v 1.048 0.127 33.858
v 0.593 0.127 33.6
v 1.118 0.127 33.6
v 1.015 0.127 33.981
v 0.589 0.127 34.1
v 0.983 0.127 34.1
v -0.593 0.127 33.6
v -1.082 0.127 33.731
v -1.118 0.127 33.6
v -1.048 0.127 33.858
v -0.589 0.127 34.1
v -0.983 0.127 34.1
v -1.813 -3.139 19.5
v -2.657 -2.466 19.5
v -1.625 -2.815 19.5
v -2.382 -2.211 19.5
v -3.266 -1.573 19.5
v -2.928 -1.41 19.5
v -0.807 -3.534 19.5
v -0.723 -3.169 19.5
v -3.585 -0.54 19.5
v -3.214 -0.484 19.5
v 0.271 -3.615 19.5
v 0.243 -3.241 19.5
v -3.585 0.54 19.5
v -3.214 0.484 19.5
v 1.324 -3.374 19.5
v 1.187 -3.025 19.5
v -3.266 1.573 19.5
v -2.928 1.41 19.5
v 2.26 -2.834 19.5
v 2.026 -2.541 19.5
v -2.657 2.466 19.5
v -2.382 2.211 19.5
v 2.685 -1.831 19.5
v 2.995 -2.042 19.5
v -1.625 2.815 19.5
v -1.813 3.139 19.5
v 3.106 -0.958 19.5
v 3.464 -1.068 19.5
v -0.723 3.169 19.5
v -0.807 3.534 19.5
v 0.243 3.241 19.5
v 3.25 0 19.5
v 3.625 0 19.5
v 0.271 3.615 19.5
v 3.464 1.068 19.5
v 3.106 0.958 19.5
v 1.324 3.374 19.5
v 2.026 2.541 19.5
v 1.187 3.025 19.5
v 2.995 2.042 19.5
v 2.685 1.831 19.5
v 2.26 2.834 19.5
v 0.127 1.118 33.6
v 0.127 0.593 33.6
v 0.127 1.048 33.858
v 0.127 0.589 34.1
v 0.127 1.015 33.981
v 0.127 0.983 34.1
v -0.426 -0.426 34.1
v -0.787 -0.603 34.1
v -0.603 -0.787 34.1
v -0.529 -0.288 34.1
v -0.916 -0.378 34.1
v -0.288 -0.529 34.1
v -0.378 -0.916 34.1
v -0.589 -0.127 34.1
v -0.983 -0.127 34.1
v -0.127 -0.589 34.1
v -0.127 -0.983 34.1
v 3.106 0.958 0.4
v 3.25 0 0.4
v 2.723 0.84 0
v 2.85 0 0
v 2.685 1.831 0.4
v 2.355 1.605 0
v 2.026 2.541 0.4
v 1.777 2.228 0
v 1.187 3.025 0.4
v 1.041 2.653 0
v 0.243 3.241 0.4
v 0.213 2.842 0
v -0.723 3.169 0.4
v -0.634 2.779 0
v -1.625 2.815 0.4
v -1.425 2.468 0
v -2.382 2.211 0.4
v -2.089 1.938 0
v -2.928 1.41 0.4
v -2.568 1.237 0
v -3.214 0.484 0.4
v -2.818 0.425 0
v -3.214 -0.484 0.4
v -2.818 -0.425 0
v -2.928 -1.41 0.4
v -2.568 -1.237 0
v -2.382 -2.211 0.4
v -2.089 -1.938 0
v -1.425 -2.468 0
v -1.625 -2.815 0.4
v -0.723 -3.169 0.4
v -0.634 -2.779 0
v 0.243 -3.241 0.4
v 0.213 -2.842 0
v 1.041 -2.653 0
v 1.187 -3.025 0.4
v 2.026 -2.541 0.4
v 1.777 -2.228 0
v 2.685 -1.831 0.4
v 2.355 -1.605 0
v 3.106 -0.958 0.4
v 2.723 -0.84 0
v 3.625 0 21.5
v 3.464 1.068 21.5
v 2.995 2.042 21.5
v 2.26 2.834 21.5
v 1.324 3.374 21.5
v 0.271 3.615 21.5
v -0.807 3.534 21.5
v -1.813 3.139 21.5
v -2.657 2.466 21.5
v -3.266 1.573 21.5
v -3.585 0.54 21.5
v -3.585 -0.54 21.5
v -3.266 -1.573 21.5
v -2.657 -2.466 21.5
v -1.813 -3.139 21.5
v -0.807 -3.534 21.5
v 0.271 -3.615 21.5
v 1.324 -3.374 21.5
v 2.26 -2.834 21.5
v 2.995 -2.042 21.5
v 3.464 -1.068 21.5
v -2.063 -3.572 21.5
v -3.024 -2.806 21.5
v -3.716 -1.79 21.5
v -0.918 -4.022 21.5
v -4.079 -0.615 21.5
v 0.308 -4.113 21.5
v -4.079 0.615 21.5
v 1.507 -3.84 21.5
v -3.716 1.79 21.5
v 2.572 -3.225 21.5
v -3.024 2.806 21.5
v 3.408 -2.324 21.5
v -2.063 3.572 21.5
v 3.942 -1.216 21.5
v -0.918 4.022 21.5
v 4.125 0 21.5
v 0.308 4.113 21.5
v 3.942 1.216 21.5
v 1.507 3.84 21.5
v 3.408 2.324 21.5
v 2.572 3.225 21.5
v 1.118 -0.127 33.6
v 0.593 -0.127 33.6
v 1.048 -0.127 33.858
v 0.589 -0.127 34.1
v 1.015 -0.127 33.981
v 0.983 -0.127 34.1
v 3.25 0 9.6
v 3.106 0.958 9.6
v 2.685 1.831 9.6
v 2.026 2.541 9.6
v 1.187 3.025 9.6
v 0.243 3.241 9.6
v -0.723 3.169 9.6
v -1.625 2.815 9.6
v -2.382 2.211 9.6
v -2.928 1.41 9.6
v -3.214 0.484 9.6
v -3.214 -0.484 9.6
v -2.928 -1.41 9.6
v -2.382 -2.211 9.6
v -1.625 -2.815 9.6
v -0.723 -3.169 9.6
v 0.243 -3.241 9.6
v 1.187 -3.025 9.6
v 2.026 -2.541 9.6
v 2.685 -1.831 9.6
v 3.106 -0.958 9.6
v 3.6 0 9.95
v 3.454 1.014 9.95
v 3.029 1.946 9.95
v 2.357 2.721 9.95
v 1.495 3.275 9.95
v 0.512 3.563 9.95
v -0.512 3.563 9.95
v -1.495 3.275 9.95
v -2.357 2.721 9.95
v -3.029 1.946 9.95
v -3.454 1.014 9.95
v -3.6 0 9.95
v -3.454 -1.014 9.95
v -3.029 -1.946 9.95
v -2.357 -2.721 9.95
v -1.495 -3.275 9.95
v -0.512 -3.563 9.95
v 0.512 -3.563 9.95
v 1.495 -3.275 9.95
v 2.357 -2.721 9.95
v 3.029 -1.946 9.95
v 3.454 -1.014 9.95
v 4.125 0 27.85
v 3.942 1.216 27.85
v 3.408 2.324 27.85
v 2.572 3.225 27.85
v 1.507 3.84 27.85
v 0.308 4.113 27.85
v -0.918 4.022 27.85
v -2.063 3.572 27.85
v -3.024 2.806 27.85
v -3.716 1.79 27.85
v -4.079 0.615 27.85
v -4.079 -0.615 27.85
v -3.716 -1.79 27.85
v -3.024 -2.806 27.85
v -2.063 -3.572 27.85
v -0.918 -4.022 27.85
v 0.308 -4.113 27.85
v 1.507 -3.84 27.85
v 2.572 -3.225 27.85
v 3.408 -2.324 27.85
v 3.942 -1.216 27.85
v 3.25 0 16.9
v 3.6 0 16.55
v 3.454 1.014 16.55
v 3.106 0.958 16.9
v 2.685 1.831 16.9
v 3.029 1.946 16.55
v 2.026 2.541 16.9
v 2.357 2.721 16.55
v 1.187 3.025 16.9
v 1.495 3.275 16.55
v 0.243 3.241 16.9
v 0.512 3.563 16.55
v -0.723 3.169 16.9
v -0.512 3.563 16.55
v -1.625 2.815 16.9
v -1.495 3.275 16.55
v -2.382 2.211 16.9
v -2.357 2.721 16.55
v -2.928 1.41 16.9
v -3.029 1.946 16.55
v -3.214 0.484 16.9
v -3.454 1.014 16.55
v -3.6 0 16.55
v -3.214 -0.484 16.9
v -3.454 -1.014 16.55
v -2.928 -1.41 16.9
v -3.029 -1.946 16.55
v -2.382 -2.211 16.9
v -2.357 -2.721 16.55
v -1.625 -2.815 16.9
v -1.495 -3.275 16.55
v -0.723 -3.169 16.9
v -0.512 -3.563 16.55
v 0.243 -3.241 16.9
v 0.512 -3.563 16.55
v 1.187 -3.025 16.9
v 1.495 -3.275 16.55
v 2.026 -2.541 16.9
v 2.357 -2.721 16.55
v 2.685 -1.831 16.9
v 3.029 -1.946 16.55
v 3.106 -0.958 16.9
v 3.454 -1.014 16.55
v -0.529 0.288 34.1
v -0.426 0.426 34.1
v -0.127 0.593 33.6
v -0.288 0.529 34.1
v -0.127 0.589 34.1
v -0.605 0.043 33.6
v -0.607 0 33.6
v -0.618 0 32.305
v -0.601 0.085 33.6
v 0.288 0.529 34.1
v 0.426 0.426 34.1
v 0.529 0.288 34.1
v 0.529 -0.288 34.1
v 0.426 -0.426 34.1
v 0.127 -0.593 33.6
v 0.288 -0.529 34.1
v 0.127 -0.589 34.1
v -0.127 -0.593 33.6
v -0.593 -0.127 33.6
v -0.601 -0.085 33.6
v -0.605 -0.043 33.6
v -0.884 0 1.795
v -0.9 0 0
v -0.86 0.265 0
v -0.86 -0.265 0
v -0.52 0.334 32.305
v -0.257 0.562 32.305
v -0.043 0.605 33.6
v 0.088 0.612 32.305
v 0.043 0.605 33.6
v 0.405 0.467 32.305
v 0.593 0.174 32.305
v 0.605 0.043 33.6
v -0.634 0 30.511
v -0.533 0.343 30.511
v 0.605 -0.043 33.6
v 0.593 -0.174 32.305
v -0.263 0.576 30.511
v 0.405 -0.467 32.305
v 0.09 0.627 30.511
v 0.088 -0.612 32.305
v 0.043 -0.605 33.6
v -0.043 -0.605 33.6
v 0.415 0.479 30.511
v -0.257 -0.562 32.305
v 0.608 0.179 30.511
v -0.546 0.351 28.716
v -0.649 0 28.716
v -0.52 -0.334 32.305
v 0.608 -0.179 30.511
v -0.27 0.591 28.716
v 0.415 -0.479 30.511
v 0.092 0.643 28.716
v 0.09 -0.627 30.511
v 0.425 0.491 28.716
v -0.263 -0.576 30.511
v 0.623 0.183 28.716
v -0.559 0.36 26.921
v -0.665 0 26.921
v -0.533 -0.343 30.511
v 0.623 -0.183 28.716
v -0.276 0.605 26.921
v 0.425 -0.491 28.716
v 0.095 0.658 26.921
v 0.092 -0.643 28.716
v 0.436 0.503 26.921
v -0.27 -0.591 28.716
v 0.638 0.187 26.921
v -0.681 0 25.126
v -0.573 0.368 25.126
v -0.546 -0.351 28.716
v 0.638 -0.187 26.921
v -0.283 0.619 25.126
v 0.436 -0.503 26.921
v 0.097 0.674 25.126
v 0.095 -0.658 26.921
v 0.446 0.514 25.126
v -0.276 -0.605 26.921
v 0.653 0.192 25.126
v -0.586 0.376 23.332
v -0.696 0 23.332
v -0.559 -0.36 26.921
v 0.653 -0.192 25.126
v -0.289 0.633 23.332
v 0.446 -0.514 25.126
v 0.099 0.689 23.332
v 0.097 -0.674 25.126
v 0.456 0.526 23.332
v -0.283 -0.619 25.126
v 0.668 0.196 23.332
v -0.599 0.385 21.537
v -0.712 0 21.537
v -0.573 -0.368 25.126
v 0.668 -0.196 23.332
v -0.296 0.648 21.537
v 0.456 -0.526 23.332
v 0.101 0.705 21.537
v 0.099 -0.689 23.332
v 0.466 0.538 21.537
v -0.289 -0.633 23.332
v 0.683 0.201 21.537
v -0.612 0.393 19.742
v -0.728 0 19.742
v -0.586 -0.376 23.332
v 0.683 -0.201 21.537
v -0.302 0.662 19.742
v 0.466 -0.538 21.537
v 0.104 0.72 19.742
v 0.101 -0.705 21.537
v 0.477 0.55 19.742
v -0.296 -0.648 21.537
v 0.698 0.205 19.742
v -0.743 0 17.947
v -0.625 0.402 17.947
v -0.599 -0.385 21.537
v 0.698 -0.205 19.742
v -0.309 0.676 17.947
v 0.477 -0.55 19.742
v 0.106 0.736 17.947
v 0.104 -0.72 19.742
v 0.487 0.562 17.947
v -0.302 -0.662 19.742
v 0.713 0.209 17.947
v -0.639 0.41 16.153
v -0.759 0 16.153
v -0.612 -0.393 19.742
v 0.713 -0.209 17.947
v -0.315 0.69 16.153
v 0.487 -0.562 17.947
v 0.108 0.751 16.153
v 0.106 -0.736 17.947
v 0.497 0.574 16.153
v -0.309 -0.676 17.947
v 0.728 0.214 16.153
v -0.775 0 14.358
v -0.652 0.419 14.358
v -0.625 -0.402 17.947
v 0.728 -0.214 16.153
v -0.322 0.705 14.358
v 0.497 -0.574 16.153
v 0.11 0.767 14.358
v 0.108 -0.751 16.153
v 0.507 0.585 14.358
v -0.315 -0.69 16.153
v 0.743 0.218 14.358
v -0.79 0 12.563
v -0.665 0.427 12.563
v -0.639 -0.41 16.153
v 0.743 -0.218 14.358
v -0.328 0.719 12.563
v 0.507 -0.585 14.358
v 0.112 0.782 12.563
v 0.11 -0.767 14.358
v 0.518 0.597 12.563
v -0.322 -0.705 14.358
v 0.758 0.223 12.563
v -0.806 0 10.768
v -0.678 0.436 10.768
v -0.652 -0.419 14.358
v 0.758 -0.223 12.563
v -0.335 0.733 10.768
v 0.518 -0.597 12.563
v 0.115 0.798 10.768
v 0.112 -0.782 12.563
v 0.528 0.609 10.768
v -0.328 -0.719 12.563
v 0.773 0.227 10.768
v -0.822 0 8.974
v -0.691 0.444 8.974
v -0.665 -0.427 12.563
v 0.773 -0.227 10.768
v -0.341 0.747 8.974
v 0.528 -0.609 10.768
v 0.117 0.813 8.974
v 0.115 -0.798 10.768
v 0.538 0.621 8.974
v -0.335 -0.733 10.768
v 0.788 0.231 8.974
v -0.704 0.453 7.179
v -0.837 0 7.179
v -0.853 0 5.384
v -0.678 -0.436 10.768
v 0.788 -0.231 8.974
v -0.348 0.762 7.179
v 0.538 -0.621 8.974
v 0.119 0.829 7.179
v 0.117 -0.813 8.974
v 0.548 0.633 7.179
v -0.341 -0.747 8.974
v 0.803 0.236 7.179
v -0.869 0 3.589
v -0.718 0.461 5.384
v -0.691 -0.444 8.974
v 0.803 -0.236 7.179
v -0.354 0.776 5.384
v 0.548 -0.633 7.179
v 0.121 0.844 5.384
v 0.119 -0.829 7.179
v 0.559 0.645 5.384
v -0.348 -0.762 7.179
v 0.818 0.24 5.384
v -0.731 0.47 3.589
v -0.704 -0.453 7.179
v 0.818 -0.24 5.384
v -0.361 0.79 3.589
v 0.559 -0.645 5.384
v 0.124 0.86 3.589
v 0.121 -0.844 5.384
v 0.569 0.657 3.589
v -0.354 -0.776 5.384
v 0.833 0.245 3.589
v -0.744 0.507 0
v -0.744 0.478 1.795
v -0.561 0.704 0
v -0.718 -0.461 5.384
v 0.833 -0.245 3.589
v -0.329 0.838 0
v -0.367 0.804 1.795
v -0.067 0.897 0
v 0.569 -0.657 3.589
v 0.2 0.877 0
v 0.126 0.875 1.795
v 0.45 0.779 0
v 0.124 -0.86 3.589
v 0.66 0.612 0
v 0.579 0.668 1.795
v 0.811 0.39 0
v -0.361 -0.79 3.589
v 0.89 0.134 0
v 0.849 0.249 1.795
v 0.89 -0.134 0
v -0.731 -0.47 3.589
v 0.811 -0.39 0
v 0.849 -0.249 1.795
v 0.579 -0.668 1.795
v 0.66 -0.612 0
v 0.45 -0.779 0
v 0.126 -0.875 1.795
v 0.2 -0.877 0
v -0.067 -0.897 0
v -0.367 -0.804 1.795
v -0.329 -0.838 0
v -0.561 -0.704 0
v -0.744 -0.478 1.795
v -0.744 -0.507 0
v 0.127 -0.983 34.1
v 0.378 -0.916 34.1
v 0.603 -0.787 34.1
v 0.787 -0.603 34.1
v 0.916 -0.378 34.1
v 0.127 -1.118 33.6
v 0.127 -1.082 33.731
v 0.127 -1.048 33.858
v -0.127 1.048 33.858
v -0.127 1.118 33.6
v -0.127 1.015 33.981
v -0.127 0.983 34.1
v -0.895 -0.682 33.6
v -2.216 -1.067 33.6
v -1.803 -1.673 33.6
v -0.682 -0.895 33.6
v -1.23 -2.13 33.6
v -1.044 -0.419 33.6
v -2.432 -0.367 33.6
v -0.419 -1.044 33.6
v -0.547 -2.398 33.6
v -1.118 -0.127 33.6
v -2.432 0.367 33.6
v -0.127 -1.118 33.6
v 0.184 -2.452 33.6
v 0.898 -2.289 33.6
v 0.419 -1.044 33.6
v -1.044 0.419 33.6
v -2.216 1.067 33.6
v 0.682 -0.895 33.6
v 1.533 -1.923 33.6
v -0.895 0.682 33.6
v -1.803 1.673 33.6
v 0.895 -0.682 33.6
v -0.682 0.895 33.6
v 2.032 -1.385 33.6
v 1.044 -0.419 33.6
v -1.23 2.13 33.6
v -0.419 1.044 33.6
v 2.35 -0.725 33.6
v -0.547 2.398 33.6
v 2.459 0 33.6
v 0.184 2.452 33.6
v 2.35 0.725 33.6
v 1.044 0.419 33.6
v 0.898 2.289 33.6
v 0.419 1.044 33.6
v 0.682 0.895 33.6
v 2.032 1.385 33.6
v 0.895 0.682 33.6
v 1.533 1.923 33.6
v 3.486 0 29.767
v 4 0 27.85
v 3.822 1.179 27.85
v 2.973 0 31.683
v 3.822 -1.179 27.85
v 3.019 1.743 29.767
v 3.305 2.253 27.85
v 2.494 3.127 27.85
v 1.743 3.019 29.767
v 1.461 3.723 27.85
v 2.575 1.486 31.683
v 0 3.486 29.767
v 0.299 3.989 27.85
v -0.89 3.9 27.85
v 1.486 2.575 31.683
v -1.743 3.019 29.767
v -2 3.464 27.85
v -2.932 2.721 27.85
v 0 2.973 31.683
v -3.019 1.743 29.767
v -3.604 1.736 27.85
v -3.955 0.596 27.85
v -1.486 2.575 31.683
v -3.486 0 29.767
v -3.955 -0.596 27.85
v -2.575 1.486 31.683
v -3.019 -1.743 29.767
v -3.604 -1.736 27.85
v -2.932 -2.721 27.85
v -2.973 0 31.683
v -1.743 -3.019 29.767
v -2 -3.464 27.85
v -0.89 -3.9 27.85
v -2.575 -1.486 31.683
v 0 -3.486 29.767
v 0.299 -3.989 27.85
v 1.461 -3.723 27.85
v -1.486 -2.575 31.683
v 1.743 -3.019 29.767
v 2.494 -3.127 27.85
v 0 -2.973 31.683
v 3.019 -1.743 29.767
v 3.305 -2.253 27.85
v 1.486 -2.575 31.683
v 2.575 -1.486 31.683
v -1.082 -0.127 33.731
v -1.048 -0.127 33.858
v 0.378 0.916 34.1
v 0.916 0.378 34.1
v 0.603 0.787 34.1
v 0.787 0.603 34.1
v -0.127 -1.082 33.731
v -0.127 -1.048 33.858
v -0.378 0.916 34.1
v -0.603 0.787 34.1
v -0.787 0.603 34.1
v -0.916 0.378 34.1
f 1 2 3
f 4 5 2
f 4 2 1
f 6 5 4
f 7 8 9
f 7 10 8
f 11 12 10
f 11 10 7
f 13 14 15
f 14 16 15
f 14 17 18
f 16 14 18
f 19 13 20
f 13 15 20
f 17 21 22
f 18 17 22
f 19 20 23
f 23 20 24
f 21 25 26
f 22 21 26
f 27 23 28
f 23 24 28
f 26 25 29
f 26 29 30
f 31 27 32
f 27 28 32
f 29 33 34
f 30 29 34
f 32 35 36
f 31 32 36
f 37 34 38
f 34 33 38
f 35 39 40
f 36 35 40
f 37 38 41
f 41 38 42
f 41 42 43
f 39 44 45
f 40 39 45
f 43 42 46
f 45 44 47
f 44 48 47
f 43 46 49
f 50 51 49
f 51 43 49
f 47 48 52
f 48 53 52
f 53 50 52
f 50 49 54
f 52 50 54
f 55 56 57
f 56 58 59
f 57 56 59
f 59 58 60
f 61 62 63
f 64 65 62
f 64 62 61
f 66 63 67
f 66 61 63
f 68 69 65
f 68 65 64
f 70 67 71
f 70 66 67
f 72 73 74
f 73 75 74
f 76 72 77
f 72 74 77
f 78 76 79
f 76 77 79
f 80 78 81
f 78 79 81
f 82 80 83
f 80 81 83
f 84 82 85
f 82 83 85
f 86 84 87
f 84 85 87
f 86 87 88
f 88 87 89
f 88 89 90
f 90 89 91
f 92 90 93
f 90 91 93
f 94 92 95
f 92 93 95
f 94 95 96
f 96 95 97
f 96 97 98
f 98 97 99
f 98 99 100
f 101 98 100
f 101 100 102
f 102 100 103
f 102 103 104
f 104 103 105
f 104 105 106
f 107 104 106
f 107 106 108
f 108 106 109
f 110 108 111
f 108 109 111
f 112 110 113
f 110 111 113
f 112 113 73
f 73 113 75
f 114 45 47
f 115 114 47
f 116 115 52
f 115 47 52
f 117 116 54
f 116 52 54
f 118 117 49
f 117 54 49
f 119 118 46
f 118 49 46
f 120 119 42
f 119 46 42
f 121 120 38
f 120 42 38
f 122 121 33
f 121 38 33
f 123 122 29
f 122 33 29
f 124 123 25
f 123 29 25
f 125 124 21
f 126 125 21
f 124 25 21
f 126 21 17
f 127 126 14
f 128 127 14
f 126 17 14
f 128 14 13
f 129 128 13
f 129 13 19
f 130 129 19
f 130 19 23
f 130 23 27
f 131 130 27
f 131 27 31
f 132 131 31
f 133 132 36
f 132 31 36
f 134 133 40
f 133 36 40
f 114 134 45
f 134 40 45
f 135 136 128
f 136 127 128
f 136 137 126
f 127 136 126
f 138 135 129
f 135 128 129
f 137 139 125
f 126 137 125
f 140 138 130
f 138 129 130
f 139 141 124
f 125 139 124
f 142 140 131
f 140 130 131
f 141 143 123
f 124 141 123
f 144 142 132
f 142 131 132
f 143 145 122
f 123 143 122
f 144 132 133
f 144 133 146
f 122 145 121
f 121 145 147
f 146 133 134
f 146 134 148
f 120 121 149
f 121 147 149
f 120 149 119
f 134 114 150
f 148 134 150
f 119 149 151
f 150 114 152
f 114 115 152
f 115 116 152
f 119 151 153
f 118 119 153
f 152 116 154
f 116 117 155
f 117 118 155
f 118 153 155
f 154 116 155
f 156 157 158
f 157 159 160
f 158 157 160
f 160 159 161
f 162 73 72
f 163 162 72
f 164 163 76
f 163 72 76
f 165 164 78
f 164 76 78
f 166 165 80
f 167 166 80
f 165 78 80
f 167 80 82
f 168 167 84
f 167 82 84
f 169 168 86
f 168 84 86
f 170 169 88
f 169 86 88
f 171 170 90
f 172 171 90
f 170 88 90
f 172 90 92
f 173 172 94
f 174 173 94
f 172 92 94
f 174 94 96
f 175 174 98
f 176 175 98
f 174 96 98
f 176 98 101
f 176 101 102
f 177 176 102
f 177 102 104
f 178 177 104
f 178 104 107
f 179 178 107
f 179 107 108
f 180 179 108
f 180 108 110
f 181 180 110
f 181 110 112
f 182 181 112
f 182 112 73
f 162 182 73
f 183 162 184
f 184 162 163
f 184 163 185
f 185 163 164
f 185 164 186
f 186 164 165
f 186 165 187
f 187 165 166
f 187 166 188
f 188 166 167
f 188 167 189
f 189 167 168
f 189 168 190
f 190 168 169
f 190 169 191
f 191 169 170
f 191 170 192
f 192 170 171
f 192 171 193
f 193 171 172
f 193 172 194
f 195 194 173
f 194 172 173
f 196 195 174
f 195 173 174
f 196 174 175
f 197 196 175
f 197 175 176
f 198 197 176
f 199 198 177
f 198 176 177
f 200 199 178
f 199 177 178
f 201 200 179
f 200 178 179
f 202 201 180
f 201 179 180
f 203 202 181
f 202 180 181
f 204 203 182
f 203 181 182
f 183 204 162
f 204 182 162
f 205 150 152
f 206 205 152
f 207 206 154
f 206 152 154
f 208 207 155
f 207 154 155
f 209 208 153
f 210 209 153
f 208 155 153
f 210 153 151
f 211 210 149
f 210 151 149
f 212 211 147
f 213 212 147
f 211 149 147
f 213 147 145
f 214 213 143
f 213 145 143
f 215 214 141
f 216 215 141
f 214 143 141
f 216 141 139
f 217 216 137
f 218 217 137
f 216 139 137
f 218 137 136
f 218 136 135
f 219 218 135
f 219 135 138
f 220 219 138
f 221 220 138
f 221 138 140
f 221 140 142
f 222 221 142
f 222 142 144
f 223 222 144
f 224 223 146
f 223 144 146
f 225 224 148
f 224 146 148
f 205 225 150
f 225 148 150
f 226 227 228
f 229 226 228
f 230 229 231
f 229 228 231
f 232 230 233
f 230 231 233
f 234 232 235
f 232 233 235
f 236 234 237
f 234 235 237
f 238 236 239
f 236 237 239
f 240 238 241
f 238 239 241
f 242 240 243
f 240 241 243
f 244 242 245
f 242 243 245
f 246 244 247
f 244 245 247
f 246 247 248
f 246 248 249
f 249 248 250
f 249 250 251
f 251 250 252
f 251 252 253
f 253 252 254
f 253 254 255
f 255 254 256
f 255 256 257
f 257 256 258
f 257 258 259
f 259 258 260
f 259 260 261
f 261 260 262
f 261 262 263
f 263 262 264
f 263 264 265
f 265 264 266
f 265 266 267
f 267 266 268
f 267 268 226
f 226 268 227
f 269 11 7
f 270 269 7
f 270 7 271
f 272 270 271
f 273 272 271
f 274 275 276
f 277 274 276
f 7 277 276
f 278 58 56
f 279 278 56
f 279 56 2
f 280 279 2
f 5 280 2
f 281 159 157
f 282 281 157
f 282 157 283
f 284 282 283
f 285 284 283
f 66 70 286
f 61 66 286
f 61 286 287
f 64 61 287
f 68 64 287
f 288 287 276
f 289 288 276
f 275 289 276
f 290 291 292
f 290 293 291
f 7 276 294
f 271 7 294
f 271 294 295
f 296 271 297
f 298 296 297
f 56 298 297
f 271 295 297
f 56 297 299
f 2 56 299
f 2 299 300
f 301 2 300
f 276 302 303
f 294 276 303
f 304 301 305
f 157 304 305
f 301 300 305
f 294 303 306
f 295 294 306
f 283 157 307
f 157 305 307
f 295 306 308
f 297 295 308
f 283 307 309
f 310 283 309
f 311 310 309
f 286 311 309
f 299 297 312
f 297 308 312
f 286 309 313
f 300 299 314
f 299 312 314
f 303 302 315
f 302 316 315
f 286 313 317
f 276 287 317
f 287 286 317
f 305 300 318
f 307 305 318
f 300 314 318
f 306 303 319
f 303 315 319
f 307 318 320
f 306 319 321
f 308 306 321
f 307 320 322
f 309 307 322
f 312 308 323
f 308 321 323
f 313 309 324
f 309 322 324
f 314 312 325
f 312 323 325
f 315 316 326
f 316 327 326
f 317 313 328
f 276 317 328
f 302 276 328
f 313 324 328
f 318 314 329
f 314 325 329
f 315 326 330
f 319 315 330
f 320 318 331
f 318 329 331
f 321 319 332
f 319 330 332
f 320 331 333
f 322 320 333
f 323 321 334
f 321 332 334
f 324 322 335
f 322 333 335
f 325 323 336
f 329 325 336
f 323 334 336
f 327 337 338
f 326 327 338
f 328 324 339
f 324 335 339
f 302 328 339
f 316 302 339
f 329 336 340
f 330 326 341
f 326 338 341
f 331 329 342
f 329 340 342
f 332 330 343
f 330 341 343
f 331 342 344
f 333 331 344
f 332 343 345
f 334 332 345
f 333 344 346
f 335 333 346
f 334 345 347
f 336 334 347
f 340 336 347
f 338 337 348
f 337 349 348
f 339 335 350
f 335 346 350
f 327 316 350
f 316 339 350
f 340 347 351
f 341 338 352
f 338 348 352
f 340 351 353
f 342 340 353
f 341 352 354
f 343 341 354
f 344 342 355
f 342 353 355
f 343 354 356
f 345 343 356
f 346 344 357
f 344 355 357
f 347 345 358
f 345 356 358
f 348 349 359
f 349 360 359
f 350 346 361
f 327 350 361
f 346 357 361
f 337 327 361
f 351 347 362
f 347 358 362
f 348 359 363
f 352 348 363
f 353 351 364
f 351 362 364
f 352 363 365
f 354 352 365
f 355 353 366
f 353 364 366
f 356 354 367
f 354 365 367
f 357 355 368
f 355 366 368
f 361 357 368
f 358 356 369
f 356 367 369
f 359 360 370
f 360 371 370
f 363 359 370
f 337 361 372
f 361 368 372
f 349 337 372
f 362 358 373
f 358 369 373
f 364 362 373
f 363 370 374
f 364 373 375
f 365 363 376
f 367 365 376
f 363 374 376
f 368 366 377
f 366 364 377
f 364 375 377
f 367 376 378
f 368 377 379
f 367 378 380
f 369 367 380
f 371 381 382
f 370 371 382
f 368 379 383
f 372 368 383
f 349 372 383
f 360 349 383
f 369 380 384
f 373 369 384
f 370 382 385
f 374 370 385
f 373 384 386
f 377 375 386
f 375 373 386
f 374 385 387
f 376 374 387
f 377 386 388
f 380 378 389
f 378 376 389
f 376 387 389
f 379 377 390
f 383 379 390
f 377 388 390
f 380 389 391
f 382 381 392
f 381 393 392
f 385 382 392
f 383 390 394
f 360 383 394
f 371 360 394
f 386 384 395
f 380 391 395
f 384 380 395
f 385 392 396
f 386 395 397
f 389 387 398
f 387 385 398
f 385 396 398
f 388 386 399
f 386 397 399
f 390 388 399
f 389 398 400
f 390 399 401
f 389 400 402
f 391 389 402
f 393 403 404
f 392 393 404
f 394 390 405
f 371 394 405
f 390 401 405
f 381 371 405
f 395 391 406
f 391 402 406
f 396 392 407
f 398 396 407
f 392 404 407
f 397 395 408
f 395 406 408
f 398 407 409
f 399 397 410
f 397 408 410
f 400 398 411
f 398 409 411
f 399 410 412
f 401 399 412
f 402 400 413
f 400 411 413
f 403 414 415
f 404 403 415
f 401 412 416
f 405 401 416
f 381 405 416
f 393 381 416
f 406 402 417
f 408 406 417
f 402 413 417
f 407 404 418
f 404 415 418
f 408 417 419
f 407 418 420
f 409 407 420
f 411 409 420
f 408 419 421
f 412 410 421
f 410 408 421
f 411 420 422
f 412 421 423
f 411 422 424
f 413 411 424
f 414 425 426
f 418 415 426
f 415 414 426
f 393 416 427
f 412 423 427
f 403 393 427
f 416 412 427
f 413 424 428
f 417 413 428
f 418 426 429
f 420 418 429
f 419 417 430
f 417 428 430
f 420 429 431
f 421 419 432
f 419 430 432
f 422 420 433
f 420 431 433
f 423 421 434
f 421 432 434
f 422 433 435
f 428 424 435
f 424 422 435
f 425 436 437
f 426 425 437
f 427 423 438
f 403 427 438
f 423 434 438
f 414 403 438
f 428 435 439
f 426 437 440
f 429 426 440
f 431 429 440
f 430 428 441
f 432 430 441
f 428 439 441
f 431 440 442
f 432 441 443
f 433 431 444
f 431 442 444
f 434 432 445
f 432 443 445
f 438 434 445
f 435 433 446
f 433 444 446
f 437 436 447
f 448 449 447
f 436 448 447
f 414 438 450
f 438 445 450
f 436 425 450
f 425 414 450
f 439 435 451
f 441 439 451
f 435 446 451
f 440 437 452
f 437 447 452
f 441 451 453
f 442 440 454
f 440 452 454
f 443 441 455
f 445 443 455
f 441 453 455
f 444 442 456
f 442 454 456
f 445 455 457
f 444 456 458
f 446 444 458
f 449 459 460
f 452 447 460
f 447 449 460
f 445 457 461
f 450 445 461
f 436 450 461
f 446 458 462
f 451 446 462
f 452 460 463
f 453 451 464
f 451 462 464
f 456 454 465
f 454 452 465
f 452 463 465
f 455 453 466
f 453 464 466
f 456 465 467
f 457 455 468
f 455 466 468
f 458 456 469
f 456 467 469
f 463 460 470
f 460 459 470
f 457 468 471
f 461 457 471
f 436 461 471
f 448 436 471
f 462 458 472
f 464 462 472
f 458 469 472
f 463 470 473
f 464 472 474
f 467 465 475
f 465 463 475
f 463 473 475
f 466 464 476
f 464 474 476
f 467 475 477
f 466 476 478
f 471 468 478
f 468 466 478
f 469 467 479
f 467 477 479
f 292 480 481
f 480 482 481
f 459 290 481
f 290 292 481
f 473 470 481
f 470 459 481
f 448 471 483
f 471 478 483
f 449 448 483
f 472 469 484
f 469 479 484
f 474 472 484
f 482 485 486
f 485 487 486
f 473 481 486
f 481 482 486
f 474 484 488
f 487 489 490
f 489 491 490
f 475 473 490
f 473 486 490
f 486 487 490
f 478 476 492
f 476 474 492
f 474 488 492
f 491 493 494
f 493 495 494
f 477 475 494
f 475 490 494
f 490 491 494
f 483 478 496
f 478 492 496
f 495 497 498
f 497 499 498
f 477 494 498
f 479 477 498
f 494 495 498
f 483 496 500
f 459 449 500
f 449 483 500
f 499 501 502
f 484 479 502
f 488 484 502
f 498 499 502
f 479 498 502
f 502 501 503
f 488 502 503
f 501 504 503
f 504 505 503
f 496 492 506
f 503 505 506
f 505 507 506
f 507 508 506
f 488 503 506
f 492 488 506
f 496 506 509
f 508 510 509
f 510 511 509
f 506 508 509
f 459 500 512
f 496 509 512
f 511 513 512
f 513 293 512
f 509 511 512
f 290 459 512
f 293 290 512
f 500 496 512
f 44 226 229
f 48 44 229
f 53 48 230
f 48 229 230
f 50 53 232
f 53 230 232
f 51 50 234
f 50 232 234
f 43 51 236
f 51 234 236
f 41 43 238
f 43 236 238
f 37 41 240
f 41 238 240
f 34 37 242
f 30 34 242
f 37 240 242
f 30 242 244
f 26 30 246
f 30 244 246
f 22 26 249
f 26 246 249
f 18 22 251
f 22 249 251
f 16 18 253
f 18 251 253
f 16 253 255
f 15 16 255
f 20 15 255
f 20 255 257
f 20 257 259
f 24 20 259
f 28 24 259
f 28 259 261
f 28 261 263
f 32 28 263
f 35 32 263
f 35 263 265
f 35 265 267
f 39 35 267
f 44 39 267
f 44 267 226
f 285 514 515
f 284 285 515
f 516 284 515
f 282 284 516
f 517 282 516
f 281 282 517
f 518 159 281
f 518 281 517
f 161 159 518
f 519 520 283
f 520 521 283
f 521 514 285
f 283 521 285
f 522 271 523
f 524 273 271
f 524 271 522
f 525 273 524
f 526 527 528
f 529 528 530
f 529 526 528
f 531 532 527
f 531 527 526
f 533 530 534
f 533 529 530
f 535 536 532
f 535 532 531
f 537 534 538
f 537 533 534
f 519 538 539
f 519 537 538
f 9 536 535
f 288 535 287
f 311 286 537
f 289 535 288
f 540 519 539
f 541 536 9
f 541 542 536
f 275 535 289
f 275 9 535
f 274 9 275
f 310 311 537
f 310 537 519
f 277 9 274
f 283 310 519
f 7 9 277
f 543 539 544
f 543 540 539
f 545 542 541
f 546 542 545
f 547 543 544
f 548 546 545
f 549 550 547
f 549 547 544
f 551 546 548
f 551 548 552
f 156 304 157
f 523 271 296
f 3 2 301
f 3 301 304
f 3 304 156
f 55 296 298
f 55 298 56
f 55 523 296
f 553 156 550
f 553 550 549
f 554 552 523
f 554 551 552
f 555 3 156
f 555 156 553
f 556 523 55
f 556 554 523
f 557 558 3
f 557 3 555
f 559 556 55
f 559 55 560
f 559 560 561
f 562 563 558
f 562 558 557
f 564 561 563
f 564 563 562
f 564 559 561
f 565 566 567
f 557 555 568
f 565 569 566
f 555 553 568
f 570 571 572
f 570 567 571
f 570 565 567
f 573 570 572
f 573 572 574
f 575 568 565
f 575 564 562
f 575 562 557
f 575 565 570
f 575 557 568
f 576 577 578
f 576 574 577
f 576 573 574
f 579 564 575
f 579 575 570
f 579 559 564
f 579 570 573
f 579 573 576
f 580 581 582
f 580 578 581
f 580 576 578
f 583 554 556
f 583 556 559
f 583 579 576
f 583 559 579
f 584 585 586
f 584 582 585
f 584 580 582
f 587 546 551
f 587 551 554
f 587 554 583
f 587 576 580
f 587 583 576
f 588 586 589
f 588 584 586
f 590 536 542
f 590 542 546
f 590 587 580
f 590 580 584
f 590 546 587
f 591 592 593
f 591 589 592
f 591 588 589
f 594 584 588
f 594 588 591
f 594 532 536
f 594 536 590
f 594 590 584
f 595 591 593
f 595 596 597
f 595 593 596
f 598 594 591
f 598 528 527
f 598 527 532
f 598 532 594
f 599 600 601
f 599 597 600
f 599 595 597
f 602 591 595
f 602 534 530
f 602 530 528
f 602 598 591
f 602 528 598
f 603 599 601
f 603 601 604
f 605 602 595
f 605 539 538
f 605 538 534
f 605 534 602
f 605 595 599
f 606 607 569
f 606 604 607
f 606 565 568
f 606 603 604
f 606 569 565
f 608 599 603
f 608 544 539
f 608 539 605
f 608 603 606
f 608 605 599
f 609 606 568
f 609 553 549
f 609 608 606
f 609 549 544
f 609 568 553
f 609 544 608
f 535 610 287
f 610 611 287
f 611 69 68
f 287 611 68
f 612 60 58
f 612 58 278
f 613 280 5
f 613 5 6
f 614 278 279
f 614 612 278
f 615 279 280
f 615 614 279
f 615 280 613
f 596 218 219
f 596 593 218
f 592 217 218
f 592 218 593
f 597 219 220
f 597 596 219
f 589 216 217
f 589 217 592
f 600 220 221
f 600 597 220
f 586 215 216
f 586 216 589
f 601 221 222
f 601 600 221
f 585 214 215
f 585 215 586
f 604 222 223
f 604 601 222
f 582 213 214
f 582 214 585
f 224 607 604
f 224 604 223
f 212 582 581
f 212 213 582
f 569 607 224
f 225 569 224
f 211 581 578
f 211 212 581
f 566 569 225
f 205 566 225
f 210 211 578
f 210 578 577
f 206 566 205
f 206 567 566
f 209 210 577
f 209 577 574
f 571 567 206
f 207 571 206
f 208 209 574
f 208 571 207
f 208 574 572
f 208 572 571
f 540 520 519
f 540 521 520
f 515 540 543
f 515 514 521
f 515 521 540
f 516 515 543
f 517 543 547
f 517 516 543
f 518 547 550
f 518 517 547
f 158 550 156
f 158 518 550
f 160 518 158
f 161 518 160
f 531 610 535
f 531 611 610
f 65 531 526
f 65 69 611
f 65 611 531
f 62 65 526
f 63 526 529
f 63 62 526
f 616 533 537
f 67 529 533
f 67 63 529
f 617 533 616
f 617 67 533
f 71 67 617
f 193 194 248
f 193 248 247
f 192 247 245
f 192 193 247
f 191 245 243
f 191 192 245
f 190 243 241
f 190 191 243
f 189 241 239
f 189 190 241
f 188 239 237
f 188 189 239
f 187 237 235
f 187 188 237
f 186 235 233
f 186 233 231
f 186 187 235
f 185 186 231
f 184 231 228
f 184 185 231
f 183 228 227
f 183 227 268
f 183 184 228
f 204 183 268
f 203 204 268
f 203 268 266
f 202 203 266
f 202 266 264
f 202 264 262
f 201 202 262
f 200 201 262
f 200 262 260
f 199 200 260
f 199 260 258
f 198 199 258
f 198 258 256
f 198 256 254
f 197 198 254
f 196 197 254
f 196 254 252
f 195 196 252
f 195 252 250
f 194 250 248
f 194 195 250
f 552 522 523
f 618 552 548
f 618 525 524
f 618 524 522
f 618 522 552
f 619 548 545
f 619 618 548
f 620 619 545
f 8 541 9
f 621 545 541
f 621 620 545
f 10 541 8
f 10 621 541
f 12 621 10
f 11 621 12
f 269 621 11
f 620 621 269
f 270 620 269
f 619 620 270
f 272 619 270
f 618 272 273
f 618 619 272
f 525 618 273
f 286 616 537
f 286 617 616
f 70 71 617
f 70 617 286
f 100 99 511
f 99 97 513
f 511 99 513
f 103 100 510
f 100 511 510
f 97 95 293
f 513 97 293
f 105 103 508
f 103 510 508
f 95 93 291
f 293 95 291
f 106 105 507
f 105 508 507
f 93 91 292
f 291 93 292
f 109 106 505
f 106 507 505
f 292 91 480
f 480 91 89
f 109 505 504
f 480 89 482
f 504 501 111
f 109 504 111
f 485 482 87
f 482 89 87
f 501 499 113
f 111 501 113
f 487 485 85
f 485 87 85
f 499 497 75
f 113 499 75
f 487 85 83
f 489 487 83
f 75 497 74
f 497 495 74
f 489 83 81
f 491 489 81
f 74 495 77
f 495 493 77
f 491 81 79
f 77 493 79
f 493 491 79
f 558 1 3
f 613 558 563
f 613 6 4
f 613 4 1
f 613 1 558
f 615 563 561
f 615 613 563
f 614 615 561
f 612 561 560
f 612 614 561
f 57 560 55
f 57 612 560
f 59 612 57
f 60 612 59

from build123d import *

# Parameters (mm, degrees)
SKETCH1_R               = 3.25
EXTRUDE1_DEPTH          = 10
SKETCH2_R               = 3.6
EXTRUDE2_DEPTH          = 6.5
SKETCH3_R               = 3.25
EXTRUDE3_DEPTH          = 3
SKETCH4_R               = 3.625
EXTRUDE4_DEPTH          = 2
SKETCH5_R               = 4.125
EXTRUDE5_DEPTH          = 6.35
SKETCH6_R               = 4
EXTRUDE6_DEPTH          = 5.75
EXTRUDE6_TAPER          = 15
SKETCH7_R               = 1.125
EXTRUDE7_DEPTH          = 0.5
EXTRUDE7_TAPER          = 15
SKETCH8_W               = 0.254
SKETCH8_H               = 4.684061481
CUT_EXTRUDE_THIN2_DEPTH = 0.5
SKETCH9_W               = 3.205351329
SKETCH9_H               = 0.254
CUT_EXTRUDE_THIN3_DEPTH = 0.5
CHAMFER1_SIZE           = 0.4
SKETCH10_R              = 0.9
CUT_EXTRUDE1_DEPTH      = 34.1
CUT_EXTRUDE1_DRAFT      = -0.5


with BuildPart() as part:
    # Sketch1 → Extrude1 (new body)
    with BuildSketch(Plane.XY):
        Circle(SKETCH1_R)
    extrude(amount=EXTRUDE1_DEPTH)

    # Sketch2 → Extrude2 (add)
    with BuildSketch(Plane.XY.offset(10)):
        with Locations(Location((0, 0, 0), (0, 0, 180))):
            Circle(SKETCH2_R)
    extrude(amount=EXTRUDE2_DEPTH)

    # Sketch3 → Extrude3 (add)
    with BuildSketch(Plane.XY.offset(16.5)):
        Circle(SKETCH3_R)
    extrude(amount=EXTRUDE3_DEPTH)

    # Sketch4 → Extrude4 (add)
    with BuildSketch(Plane.XY.offset(19.5)):
        Circle(SKETCH4_R)
    extrude(amount=EXTRUDE4_DEPTH)

    # Sketch5 → Extrude5 (add)
    with BuildSketch(Plane.XY.offset(21.5)):
        Circle(SKETCH5_R)
    extrude(amount=EXTRUDE5_DEPTH)

    # Sketch6 → Extrude6 (add)
    with BuildSketch(Plane.XY.offset(27.85)):
        Circle(SKETCH6_R)
    extrude(amount=EXTRUDE6_DEPTH, taper=EXTRUDE6_TAPER)

    # Sketch7 → Extrude7 (add)
    with BuildSketch(Plane.XY.offset(33.6)):
        Circle(SKETCH7_R)
    extrude(amount=EXTRUDE7_DEPTH, taper=EXTRUDE7_TAPER)

    # Sketch8 → Cut-Extrude-Thin2 (cut)
    with BuildSketch(Plane.XY.offset(34.1)):
        with Locations((0, -0.157007647)):
            Rectangle(SKETCH8_W, SKETCH8_H)
    extrude(amount=-CUT_EXTRUDE_THIN2_DEPTH, mode=Mode.SUBTRACT)

    # Sketch9 → Cut-Extrude-Thin3 (cut)
    with BuildSketch(Plane.XY.offset(34.1)):
        with Locations((-0.477675664, 0)):
            Rectangle(SKETCH9_W, SKETCH9_H)
    extrude(amount=-CUT_EXTRUDE_THIN3_DEPTH, mode=Mode.SUBTRACT)

    # Chamfer1
    # the kernel refuses this chamfer: 0.4 mm, written as the material it adds along each edge
    with BuildSketch(Plane(origin=(0, 0, 16.5), x_dir=(1, 0, 0), z_dir=(0, -1, 0))) as chamfer1_piece_1_section:
        Polygon((3.25, CHAMFER1_SIZE), (3.25 + CHAMFER1_SIZE, 0), (3.25, 0), align=None)
    chamfer1_piece_1 = revolve(axis=Axis((0, 0, 16.5), (0, 0, 1)), mode=Mode.PRIVATE)
    chamfer1_piece_1 = chamfer1_piece_1 & Plane(origin=(0, 0, 16.722023518), x_dir=(-1, 0, 0), z_dir=(0, 0, -1)) * Cylinder(3.6, 15, mode=Mode.PRIVATE)
    add(chamfer1_piece_1)
    with BuildSketch(Plane(origin=(0, 0, 10), x_dir=(1, 0, 0), z_dir=(0, -1, 0))) as chamfer1_piece_2_section:
        Polygon((3.25 + CHAMFER1_SIZE, 0), (3.25, -CHAMFER1_SIZE), (3.25, 0), align=None)
    chamfer1_piece_2 = revolve(axis=Axis((0, 0, 10), (0, 0, 1)), mode=Mode.PRIVATE)
    chamfer1_piece_2 = chamfer1_piece_2 & Plane(origin=(0, 0, 9.777976482), x_dir=(-1, 0, 0), z_dir=(0, 0, -1)) * Cylinder(3.6, 15, mode=Mode.PRIVATE)
    add(chamfer1_piece_2)
    # the kernel refuses this chamfer: 0.4 mm, written as the material it takes off along each edge
    with BuildSketch(Plane(origin=(0, 0, 0), x_dir=(1, 0, 0), z_dir=(0, -1, 0))) as chamfer1_2_piece_1:
        Polygon((3.25, CHAMFER1_SIZE), (3.25 - CHAMFER1_SIZE, 0), (3.25, 0), align=None)
    revolve(axis=Axis((0, 0, 0), (0, 0, 1)), mode=Mode.SUBTRACT)


with BuildPart() as cut_extrude1_tool:
    # Sketch10 → Cut-Extrude1 (with draft: the straight prism first)
    with BuildSketch(Plane(origin=(0, 0, 0), x_dir=(-1, 0, 0), z_dir=(0, 0, -1))):
        Circle(SKETCH10_R)
    extrude(amount=-CUT_EXTRUDE1_DEPTH)
    # Cut-Extrude1: the draft: its side faces are tilted about the plane it starts from
    cut_extrude1_sides = [cut_extrude1_tool.faces().sort_by_distance(p)[0] for p in [
        (0.9, 0, 17.05),
    ]]
    draft(cut_extrude1_sides, Plane(origin=(0, 0, 0), x_dir=(-1, 0, 0), z_dir=(0, 0, -1)), CUT_EXTRUDE1_DRAFT)


with BuildPart() as part_1:
    add(part.part)

    # Cut-Extrude1: cut by cut_extrude1_tool
    add(cut_extrude1_tool.part, mode=Mode.SUBTRACT)


solid = part_1.part
